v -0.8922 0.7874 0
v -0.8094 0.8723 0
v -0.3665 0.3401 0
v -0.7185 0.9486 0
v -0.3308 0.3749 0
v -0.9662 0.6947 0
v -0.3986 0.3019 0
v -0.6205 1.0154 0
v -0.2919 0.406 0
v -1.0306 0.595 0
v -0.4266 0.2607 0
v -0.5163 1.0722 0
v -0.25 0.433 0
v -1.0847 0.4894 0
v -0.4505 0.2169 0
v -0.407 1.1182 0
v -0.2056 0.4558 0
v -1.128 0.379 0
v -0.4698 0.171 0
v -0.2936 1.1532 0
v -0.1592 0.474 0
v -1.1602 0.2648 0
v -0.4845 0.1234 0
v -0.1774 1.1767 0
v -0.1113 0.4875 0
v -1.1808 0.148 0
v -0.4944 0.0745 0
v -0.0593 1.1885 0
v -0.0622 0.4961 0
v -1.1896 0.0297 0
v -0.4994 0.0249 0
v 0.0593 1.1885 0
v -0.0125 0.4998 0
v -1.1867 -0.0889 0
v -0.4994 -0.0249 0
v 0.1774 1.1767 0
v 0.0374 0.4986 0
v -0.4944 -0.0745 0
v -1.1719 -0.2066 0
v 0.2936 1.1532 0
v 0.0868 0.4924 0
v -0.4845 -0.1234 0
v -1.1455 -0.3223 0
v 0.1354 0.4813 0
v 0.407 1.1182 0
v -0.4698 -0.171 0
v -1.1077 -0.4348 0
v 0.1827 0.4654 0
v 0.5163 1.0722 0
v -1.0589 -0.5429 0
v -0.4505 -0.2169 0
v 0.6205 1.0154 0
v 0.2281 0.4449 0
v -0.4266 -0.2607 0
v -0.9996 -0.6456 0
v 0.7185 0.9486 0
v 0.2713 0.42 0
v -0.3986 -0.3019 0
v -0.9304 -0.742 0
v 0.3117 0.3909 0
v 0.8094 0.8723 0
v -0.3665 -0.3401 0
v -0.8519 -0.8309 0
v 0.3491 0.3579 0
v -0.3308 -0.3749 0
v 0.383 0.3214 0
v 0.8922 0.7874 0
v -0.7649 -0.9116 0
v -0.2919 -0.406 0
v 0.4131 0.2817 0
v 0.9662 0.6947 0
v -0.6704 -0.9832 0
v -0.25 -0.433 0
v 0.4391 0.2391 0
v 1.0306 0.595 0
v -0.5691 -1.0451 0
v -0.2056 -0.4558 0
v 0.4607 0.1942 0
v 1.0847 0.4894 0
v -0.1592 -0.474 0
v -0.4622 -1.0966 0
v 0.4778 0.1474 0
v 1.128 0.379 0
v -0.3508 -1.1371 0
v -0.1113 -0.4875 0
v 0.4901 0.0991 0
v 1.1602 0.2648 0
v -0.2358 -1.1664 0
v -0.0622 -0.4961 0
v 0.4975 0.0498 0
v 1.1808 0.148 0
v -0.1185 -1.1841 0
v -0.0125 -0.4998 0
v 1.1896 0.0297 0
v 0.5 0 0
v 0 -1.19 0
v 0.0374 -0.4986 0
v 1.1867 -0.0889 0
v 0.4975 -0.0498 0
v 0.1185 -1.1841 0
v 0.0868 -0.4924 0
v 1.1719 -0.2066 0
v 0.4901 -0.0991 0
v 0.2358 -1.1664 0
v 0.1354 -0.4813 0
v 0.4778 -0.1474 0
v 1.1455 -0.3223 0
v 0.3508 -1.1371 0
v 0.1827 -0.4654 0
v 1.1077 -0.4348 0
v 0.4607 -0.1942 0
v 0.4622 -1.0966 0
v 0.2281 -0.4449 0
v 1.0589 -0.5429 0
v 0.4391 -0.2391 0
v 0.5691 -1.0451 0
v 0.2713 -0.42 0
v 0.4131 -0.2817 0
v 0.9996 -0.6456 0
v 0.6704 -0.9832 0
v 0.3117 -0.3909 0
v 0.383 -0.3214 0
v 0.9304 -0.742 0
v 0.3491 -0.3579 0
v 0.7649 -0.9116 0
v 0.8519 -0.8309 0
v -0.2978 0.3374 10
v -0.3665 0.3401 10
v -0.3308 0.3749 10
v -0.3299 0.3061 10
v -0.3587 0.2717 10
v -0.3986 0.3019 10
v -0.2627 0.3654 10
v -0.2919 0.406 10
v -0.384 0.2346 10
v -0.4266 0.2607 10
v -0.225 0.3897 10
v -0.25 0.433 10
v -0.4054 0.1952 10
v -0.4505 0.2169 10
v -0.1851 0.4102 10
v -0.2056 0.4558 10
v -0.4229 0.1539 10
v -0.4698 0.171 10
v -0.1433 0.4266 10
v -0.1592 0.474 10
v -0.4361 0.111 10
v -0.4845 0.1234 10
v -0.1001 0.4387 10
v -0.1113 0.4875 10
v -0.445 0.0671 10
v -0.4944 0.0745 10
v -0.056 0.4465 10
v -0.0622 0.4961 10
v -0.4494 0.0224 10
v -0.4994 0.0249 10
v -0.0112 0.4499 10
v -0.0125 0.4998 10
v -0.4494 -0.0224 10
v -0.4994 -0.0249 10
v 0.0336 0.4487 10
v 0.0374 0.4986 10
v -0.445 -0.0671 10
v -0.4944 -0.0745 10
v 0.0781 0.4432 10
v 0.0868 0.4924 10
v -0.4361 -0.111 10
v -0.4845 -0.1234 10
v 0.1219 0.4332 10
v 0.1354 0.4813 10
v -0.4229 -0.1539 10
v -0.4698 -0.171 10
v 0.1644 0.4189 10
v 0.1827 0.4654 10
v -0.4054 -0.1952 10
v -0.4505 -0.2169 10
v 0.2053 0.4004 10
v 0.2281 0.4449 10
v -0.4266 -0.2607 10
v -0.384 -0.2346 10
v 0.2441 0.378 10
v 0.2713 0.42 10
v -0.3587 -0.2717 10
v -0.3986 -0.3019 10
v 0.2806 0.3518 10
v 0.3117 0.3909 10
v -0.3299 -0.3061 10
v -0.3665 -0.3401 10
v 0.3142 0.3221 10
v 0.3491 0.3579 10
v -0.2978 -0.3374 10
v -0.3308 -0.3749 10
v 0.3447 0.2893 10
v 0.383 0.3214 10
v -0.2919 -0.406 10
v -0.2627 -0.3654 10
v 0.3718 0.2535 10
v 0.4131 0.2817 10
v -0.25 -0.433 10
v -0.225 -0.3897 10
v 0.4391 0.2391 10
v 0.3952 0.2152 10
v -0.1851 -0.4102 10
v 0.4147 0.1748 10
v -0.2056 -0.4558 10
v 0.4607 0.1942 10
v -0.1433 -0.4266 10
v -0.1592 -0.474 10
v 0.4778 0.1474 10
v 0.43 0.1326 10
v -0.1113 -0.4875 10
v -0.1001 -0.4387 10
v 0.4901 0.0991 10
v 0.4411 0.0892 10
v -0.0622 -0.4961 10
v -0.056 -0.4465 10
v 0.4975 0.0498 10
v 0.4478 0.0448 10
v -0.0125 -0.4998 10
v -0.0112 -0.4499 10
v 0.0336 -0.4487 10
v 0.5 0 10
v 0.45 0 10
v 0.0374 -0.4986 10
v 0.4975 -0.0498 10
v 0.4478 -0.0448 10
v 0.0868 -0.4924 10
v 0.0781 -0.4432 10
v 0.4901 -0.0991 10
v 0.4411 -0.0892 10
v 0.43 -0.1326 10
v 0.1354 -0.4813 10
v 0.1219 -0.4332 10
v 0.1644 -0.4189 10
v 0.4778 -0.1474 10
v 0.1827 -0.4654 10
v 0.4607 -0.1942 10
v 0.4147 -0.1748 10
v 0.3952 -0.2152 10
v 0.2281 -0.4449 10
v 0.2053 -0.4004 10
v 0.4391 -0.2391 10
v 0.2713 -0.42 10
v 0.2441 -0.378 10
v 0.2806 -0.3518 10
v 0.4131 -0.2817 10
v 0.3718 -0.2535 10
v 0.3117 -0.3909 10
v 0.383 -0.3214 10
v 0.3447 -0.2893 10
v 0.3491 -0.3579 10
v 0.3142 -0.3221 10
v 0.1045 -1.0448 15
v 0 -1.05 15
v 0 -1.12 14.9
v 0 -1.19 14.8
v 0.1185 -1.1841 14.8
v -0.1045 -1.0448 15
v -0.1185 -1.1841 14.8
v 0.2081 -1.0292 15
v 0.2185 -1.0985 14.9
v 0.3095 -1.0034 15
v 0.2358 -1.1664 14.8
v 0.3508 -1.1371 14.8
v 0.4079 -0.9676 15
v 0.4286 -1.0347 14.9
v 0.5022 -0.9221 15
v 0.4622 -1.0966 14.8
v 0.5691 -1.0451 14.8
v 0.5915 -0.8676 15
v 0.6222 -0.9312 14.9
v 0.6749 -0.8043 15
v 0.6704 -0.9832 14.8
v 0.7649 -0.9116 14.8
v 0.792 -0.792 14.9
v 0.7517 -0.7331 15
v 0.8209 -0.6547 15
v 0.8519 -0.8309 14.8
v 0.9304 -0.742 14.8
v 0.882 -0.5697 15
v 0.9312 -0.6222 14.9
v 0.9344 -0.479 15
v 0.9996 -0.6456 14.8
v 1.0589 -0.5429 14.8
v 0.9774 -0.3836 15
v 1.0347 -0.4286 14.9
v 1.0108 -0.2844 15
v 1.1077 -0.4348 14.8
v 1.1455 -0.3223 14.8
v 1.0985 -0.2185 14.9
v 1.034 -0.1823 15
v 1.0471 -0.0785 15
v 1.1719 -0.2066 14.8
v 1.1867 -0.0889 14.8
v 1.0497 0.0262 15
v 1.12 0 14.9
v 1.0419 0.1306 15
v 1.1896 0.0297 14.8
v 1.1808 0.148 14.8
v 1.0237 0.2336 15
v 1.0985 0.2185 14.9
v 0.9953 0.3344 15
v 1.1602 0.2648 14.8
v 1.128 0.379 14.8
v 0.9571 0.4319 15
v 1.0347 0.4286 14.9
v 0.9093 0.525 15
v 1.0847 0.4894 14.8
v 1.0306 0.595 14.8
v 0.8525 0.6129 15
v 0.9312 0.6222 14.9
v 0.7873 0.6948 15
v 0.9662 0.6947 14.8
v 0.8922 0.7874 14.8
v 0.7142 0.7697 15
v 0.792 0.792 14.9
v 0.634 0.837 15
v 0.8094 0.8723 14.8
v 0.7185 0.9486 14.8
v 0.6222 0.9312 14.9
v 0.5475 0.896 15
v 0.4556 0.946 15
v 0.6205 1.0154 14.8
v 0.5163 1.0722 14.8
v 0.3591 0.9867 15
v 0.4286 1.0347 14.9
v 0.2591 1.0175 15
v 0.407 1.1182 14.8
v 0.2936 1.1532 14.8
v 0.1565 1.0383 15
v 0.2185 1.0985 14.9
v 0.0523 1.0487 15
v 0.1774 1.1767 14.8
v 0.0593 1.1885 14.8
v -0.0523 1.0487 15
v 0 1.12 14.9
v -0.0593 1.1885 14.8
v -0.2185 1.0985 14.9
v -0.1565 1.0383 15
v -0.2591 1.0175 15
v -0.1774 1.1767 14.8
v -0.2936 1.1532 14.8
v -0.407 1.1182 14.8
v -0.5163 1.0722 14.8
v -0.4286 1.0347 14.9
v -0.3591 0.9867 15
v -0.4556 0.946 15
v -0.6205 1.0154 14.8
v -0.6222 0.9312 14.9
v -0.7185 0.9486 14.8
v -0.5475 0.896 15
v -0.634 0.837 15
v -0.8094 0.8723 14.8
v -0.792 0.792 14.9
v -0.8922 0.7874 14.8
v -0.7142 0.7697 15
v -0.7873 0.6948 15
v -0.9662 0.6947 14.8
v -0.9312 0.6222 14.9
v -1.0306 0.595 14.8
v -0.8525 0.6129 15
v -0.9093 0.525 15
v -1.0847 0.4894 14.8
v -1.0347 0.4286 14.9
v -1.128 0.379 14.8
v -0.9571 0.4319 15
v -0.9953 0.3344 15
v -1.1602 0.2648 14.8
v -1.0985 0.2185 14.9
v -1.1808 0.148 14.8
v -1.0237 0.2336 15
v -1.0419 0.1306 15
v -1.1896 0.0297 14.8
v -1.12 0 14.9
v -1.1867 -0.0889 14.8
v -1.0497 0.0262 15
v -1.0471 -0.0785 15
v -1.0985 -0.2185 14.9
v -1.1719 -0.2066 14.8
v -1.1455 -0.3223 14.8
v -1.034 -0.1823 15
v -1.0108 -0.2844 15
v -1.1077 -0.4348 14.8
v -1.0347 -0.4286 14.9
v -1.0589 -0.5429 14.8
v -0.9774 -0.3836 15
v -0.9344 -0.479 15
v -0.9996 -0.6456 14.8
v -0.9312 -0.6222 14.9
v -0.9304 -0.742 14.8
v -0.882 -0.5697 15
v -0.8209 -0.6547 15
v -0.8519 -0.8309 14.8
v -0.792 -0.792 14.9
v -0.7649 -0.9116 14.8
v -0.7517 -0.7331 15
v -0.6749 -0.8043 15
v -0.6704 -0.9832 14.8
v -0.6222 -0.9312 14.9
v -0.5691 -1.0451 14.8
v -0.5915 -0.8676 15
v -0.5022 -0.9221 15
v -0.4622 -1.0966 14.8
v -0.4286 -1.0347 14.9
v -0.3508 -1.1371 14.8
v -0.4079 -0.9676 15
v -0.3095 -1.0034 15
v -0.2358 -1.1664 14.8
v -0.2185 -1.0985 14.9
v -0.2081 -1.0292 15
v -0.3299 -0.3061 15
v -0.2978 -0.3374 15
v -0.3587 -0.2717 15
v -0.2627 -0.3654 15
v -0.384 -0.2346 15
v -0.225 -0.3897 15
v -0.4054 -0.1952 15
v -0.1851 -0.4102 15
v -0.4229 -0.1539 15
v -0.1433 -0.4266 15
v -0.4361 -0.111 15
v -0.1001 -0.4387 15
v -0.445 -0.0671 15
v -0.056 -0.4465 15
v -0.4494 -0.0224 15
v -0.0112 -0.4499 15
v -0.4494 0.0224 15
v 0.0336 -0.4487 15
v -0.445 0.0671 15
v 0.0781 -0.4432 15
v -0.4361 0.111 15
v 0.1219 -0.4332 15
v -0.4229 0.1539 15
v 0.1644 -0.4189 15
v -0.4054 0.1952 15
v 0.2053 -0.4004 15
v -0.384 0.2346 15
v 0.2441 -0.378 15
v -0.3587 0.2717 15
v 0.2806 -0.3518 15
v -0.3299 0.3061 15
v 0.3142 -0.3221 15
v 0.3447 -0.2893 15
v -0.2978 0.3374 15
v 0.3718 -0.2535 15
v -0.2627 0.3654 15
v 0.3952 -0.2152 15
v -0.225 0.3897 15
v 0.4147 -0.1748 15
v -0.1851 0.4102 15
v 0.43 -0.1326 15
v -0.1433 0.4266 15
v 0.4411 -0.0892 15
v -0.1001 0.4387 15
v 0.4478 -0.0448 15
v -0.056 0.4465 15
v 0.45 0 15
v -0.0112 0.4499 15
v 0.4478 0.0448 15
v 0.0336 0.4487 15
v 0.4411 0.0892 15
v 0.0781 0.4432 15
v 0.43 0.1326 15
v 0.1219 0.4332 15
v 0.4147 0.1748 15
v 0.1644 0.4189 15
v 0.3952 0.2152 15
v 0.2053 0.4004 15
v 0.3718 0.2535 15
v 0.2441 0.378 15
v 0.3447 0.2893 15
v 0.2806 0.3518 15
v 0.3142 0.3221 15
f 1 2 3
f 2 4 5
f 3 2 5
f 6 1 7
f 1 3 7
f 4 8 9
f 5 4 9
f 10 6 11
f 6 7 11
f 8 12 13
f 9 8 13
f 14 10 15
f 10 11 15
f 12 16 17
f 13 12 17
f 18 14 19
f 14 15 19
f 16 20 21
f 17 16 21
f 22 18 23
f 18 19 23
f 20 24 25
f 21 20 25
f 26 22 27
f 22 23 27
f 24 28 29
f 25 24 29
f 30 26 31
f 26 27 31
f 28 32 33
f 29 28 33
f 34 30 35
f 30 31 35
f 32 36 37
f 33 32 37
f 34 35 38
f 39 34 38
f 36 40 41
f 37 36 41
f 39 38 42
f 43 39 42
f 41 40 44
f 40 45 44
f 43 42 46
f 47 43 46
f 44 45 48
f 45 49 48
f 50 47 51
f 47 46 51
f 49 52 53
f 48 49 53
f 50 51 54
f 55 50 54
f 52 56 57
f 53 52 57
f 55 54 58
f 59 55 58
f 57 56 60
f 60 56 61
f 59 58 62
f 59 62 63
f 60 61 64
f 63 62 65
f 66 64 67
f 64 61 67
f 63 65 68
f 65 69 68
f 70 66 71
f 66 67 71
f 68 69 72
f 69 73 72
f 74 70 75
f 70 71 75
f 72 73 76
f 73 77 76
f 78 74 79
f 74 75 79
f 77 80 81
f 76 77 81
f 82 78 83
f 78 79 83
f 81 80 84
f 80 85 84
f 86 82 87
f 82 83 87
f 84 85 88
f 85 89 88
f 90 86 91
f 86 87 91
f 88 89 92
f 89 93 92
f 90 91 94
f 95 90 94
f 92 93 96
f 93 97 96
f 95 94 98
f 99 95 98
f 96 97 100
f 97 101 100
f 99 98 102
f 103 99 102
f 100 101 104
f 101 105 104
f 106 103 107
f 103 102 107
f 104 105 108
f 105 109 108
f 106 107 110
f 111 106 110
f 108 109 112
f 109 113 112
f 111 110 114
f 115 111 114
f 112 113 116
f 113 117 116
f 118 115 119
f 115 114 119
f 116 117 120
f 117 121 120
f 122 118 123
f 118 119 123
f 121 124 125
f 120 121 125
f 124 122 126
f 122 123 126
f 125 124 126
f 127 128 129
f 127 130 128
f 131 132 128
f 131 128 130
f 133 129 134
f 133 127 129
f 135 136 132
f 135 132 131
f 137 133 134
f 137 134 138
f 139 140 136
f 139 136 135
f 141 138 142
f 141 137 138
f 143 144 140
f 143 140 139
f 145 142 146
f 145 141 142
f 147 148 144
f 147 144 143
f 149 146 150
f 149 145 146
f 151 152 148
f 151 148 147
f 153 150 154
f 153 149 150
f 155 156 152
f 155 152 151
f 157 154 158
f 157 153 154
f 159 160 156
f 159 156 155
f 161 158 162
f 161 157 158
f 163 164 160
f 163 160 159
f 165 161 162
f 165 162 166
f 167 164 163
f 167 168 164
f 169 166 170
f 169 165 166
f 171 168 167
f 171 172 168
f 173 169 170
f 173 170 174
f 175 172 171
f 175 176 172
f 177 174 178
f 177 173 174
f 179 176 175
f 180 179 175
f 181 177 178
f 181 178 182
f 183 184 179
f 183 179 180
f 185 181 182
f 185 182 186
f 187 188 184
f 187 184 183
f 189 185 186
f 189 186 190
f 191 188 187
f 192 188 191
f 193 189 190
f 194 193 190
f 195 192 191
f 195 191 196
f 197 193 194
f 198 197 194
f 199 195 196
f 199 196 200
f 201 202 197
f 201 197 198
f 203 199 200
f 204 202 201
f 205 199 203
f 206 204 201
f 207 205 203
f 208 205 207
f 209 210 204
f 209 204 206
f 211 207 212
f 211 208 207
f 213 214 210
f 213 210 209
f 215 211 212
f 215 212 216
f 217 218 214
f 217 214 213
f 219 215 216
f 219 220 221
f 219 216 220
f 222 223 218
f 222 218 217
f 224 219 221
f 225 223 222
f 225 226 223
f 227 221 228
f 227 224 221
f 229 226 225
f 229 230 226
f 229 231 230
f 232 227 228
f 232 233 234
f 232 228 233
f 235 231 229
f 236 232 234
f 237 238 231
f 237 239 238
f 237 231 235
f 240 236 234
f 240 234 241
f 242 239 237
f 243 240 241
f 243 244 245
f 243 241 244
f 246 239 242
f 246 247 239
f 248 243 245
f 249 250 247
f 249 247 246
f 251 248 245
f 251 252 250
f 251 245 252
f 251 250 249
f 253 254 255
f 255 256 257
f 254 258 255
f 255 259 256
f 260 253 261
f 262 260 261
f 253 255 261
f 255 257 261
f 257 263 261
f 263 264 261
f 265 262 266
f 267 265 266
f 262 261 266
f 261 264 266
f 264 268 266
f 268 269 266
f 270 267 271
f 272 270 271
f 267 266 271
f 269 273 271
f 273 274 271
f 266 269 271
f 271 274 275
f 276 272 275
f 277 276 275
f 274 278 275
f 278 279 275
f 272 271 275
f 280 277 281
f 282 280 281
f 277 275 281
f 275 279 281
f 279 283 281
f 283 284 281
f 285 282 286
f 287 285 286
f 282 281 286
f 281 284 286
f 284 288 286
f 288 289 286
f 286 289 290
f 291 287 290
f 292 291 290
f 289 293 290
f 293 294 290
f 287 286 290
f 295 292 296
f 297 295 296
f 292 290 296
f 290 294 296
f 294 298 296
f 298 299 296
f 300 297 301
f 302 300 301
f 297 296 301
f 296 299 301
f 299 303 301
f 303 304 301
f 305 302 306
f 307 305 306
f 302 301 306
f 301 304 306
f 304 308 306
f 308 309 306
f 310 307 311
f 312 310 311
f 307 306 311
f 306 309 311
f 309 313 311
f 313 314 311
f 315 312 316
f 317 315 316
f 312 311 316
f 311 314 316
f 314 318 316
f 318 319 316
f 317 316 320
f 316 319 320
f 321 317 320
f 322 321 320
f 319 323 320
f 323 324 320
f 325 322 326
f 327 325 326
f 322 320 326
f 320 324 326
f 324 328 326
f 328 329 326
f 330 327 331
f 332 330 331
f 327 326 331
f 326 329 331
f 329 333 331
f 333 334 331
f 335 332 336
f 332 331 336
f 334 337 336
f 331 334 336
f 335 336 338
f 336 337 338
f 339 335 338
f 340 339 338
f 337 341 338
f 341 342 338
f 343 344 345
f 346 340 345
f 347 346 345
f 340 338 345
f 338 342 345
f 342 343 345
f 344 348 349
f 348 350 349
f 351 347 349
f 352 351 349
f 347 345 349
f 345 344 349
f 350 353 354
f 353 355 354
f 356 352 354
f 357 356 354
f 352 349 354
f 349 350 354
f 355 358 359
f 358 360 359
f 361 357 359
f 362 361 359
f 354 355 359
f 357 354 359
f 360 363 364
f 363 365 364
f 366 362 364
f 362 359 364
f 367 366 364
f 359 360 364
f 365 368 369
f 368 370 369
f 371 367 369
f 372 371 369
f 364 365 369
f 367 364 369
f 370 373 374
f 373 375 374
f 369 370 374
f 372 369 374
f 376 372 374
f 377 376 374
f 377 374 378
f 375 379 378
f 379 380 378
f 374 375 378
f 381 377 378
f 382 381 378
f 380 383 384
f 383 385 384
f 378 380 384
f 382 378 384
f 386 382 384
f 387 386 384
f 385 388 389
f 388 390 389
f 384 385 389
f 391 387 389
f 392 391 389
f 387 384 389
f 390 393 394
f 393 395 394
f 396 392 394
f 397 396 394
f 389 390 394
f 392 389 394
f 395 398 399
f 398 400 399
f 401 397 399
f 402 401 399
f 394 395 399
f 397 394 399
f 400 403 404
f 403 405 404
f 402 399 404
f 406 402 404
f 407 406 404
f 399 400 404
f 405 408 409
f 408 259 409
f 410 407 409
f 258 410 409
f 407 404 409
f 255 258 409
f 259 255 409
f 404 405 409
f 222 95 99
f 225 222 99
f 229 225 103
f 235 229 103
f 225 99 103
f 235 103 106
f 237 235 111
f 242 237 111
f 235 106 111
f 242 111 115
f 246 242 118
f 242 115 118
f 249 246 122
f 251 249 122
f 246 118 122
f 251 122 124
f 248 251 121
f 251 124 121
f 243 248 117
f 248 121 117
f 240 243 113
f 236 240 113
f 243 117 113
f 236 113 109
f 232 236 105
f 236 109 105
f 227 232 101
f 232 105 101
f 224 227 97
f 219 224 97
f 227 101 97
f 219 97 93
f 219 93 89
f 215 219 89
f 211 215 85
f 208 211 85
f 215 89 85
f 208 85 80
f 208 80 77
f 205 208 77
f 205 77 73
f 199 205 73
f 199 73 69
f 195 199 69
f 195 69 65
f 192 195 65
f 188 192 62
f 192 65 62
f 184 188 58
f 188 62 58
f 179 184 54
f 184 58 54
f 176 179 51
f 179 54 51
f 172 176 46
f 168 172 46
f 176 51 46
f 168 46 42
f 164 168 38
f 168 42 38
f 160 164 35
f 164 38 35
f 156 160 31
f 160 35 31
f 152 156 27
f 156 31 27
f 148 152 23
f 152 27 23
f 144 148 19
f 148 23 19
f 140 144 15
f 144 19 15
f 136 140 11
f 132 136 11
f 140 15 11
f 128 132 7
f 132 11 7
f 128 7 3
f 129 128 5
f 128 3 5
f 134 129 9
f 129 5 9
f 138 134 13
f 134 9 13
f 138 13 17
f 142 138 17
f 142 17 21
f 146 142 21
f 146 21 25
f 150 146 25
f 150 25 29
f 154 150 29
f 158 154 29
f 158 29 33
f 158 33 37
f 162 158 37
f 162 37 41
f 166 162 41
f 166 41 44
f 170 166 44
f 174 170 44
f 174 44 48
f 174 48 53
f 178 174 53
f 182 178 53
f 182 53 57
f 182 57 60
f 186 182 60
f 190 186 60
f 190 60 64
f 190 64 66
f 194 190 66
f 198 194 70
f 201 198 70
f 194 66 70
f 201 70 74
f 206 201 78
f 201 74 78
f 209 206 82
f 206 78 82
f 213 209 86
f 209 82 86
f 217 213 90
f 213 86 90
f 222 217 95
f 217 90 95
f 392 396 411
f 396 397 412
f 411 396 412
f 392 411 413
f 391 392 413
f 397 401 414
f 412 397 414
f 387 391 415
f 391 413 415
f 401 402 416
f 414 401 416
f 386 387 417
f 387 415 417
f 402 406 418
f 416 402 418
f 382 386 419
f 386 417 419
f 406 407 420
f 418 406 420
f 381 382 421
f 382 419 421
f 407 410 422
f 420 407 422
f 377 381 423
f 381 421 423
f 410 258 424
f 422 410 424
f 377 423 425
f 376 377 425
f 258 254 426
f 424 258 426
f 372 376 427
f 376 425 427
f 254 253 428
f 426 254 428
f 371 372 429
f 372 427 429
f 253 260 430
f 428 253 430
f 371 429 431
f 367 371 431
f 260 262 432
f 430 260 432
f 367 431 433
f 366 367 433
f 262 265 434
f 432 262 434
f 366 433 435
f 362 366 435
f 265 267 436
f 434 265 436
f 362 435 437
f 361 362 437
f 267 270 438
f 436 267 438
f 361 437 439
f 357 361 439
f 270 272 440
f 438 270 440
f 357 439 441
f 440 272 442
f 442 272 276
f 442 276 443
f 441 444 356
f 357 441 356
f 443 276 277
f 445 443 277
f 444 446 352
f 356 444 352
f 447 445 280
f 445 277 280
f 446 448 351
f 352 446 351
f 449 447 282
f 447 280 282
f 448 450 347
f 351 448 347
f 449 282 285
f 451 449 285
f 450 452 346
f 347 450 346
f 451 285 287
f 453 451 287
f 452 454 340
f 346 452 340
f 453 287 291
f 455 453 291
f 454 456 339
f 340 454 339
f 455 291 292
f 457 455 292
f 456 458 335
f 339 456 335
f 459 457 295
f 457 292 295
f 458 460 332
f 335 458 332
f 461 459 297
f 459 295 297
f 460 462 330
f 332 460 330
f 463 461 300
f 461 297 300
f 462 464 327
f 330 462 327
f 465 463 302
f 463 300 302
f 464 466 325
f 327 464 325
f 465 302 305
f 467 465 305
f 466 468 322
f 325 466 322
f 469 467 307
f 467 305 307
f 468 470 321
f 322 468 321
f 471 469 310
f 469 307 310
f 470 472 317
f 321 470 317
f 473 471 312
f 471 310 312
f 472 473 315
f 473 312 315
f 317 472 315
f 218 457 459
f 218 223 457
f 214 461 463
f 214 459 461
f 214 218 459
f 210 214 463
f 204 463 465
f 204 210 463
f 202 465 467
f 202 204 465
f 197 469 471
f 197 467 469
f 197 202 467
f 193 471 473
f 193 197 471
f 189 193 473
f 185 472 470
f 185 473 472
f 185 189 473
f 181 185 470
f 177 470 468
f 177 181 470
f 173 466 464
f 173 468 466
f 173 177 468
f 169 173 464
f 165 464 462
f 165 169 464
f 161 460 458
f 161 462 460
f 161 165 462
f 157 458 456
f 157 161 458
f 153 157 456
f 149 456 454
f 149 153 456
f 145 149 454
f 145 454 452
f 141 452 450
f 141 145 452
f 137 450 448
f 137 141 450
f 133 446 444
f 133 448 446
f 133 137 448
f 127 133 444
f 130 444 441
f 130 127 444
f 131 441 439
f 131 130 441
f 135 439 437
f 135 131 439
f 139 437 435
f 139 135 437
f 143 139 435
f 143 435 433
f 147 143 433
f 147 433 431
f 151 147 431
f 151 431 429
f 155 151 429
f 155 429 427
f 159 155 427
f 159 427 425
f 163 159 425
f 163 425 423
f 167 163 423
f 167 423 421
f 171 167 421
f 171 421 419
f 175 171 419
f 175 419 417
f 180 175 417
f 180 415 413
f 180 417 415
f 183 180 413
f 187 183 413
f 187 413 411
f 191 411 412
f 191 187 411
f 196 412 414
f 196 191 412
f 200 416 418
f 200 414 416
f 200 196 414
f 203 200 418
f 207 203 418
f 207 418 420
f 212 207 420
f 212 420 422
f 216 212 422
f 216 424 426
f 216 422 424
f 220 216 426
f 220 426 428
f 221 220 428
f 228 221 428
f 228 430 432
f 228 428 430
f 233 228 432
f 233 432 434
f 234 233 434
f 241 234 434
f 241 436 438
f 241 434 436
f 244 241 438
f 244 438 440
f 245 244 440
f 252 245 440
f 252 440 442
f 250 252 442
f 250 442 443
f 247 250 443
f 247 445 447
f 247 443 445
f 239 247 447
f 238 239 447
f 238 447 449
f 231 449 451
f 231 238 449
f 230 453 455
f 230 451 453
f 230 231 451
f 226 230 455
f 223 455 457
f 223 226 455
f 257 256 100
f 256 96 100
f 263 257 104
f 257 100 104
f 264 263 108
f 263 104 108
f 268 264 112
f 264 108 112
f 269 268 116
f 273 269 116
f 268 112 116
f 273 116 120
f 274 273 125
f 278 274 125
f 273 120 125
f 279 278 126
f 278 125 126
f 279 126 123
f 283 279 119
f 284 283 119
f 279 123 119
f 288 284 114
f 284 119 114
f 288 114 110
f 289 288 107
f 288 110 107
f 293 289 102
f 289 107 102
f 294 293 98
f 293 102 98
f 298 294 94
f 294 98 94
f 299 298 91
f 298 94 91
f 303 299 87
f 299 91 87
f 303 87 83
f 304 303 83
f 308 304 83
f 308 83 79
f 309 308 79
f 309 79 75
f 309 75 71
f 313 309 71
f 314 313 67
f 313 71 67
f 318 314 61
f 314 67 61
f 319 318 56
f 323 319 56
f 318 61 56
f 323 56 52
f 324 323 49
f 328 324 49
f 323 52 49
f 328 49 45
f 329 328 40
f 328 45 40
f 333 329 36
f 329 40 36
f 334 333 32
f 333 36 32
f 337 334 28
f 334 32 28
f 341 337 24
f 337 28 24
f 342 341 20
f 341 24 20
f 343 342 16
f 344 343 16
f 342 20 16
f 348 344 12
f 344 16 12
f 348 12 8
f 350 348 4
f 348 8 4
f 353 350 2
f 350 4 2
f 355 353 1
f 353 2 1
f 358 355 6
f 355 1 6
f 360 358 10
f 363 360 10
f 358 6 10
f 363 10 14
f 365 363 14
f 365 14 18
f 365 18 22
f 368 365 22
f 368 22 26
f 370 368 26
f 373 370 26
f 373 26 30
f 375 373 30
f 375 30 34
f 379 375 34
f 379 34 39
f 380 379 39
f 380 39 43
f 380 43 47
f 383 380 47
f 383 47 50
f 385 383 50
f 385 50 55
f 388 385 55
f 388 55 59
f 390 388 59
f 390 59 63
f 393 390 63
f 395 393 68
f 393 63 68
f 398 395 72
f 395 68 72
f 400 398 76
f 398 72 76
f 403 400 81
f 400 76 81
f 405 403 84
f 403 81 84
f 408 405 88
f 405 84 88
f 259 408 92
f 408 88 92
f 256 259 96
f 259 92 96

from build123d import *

# Parameters (mm, degrees)
F2_R     = 0.45
F3_DEPTH = 100
F4_R     = 0.5
F5_DEPTH = 10


with BuildPart() as f1:
    # F0 (on Right) → F1 (revolve)
    with BuildSketch(Plane.YZ):
        Polygon((-1.19, 0), (0, 0), (0, 15), (-1.05, 15), (-1.19, 14.8), align=None)
    revolve(axis=Axis((0, 0, 7.5), (0, 0, 1)))

    # F2 (on Top) → F3 (cut)
    with BuildSketch(Plane.XY):
        Circle(F2_R)
    extrude(amount=F3_DEPTH, mode=Mode.SUBTRACT)

    # F4 (on face) → F5 (cut)
    with BuildSketch(Plane(origin=(0, 0, 0), x_dir=(1, 0, 0), z_dir=(0, 0, -1))):
        Circle(F4_R)
    extrude(amount=-F5_DEPTH, mode=Mode.SUBTRACT)


solid = f1.part
